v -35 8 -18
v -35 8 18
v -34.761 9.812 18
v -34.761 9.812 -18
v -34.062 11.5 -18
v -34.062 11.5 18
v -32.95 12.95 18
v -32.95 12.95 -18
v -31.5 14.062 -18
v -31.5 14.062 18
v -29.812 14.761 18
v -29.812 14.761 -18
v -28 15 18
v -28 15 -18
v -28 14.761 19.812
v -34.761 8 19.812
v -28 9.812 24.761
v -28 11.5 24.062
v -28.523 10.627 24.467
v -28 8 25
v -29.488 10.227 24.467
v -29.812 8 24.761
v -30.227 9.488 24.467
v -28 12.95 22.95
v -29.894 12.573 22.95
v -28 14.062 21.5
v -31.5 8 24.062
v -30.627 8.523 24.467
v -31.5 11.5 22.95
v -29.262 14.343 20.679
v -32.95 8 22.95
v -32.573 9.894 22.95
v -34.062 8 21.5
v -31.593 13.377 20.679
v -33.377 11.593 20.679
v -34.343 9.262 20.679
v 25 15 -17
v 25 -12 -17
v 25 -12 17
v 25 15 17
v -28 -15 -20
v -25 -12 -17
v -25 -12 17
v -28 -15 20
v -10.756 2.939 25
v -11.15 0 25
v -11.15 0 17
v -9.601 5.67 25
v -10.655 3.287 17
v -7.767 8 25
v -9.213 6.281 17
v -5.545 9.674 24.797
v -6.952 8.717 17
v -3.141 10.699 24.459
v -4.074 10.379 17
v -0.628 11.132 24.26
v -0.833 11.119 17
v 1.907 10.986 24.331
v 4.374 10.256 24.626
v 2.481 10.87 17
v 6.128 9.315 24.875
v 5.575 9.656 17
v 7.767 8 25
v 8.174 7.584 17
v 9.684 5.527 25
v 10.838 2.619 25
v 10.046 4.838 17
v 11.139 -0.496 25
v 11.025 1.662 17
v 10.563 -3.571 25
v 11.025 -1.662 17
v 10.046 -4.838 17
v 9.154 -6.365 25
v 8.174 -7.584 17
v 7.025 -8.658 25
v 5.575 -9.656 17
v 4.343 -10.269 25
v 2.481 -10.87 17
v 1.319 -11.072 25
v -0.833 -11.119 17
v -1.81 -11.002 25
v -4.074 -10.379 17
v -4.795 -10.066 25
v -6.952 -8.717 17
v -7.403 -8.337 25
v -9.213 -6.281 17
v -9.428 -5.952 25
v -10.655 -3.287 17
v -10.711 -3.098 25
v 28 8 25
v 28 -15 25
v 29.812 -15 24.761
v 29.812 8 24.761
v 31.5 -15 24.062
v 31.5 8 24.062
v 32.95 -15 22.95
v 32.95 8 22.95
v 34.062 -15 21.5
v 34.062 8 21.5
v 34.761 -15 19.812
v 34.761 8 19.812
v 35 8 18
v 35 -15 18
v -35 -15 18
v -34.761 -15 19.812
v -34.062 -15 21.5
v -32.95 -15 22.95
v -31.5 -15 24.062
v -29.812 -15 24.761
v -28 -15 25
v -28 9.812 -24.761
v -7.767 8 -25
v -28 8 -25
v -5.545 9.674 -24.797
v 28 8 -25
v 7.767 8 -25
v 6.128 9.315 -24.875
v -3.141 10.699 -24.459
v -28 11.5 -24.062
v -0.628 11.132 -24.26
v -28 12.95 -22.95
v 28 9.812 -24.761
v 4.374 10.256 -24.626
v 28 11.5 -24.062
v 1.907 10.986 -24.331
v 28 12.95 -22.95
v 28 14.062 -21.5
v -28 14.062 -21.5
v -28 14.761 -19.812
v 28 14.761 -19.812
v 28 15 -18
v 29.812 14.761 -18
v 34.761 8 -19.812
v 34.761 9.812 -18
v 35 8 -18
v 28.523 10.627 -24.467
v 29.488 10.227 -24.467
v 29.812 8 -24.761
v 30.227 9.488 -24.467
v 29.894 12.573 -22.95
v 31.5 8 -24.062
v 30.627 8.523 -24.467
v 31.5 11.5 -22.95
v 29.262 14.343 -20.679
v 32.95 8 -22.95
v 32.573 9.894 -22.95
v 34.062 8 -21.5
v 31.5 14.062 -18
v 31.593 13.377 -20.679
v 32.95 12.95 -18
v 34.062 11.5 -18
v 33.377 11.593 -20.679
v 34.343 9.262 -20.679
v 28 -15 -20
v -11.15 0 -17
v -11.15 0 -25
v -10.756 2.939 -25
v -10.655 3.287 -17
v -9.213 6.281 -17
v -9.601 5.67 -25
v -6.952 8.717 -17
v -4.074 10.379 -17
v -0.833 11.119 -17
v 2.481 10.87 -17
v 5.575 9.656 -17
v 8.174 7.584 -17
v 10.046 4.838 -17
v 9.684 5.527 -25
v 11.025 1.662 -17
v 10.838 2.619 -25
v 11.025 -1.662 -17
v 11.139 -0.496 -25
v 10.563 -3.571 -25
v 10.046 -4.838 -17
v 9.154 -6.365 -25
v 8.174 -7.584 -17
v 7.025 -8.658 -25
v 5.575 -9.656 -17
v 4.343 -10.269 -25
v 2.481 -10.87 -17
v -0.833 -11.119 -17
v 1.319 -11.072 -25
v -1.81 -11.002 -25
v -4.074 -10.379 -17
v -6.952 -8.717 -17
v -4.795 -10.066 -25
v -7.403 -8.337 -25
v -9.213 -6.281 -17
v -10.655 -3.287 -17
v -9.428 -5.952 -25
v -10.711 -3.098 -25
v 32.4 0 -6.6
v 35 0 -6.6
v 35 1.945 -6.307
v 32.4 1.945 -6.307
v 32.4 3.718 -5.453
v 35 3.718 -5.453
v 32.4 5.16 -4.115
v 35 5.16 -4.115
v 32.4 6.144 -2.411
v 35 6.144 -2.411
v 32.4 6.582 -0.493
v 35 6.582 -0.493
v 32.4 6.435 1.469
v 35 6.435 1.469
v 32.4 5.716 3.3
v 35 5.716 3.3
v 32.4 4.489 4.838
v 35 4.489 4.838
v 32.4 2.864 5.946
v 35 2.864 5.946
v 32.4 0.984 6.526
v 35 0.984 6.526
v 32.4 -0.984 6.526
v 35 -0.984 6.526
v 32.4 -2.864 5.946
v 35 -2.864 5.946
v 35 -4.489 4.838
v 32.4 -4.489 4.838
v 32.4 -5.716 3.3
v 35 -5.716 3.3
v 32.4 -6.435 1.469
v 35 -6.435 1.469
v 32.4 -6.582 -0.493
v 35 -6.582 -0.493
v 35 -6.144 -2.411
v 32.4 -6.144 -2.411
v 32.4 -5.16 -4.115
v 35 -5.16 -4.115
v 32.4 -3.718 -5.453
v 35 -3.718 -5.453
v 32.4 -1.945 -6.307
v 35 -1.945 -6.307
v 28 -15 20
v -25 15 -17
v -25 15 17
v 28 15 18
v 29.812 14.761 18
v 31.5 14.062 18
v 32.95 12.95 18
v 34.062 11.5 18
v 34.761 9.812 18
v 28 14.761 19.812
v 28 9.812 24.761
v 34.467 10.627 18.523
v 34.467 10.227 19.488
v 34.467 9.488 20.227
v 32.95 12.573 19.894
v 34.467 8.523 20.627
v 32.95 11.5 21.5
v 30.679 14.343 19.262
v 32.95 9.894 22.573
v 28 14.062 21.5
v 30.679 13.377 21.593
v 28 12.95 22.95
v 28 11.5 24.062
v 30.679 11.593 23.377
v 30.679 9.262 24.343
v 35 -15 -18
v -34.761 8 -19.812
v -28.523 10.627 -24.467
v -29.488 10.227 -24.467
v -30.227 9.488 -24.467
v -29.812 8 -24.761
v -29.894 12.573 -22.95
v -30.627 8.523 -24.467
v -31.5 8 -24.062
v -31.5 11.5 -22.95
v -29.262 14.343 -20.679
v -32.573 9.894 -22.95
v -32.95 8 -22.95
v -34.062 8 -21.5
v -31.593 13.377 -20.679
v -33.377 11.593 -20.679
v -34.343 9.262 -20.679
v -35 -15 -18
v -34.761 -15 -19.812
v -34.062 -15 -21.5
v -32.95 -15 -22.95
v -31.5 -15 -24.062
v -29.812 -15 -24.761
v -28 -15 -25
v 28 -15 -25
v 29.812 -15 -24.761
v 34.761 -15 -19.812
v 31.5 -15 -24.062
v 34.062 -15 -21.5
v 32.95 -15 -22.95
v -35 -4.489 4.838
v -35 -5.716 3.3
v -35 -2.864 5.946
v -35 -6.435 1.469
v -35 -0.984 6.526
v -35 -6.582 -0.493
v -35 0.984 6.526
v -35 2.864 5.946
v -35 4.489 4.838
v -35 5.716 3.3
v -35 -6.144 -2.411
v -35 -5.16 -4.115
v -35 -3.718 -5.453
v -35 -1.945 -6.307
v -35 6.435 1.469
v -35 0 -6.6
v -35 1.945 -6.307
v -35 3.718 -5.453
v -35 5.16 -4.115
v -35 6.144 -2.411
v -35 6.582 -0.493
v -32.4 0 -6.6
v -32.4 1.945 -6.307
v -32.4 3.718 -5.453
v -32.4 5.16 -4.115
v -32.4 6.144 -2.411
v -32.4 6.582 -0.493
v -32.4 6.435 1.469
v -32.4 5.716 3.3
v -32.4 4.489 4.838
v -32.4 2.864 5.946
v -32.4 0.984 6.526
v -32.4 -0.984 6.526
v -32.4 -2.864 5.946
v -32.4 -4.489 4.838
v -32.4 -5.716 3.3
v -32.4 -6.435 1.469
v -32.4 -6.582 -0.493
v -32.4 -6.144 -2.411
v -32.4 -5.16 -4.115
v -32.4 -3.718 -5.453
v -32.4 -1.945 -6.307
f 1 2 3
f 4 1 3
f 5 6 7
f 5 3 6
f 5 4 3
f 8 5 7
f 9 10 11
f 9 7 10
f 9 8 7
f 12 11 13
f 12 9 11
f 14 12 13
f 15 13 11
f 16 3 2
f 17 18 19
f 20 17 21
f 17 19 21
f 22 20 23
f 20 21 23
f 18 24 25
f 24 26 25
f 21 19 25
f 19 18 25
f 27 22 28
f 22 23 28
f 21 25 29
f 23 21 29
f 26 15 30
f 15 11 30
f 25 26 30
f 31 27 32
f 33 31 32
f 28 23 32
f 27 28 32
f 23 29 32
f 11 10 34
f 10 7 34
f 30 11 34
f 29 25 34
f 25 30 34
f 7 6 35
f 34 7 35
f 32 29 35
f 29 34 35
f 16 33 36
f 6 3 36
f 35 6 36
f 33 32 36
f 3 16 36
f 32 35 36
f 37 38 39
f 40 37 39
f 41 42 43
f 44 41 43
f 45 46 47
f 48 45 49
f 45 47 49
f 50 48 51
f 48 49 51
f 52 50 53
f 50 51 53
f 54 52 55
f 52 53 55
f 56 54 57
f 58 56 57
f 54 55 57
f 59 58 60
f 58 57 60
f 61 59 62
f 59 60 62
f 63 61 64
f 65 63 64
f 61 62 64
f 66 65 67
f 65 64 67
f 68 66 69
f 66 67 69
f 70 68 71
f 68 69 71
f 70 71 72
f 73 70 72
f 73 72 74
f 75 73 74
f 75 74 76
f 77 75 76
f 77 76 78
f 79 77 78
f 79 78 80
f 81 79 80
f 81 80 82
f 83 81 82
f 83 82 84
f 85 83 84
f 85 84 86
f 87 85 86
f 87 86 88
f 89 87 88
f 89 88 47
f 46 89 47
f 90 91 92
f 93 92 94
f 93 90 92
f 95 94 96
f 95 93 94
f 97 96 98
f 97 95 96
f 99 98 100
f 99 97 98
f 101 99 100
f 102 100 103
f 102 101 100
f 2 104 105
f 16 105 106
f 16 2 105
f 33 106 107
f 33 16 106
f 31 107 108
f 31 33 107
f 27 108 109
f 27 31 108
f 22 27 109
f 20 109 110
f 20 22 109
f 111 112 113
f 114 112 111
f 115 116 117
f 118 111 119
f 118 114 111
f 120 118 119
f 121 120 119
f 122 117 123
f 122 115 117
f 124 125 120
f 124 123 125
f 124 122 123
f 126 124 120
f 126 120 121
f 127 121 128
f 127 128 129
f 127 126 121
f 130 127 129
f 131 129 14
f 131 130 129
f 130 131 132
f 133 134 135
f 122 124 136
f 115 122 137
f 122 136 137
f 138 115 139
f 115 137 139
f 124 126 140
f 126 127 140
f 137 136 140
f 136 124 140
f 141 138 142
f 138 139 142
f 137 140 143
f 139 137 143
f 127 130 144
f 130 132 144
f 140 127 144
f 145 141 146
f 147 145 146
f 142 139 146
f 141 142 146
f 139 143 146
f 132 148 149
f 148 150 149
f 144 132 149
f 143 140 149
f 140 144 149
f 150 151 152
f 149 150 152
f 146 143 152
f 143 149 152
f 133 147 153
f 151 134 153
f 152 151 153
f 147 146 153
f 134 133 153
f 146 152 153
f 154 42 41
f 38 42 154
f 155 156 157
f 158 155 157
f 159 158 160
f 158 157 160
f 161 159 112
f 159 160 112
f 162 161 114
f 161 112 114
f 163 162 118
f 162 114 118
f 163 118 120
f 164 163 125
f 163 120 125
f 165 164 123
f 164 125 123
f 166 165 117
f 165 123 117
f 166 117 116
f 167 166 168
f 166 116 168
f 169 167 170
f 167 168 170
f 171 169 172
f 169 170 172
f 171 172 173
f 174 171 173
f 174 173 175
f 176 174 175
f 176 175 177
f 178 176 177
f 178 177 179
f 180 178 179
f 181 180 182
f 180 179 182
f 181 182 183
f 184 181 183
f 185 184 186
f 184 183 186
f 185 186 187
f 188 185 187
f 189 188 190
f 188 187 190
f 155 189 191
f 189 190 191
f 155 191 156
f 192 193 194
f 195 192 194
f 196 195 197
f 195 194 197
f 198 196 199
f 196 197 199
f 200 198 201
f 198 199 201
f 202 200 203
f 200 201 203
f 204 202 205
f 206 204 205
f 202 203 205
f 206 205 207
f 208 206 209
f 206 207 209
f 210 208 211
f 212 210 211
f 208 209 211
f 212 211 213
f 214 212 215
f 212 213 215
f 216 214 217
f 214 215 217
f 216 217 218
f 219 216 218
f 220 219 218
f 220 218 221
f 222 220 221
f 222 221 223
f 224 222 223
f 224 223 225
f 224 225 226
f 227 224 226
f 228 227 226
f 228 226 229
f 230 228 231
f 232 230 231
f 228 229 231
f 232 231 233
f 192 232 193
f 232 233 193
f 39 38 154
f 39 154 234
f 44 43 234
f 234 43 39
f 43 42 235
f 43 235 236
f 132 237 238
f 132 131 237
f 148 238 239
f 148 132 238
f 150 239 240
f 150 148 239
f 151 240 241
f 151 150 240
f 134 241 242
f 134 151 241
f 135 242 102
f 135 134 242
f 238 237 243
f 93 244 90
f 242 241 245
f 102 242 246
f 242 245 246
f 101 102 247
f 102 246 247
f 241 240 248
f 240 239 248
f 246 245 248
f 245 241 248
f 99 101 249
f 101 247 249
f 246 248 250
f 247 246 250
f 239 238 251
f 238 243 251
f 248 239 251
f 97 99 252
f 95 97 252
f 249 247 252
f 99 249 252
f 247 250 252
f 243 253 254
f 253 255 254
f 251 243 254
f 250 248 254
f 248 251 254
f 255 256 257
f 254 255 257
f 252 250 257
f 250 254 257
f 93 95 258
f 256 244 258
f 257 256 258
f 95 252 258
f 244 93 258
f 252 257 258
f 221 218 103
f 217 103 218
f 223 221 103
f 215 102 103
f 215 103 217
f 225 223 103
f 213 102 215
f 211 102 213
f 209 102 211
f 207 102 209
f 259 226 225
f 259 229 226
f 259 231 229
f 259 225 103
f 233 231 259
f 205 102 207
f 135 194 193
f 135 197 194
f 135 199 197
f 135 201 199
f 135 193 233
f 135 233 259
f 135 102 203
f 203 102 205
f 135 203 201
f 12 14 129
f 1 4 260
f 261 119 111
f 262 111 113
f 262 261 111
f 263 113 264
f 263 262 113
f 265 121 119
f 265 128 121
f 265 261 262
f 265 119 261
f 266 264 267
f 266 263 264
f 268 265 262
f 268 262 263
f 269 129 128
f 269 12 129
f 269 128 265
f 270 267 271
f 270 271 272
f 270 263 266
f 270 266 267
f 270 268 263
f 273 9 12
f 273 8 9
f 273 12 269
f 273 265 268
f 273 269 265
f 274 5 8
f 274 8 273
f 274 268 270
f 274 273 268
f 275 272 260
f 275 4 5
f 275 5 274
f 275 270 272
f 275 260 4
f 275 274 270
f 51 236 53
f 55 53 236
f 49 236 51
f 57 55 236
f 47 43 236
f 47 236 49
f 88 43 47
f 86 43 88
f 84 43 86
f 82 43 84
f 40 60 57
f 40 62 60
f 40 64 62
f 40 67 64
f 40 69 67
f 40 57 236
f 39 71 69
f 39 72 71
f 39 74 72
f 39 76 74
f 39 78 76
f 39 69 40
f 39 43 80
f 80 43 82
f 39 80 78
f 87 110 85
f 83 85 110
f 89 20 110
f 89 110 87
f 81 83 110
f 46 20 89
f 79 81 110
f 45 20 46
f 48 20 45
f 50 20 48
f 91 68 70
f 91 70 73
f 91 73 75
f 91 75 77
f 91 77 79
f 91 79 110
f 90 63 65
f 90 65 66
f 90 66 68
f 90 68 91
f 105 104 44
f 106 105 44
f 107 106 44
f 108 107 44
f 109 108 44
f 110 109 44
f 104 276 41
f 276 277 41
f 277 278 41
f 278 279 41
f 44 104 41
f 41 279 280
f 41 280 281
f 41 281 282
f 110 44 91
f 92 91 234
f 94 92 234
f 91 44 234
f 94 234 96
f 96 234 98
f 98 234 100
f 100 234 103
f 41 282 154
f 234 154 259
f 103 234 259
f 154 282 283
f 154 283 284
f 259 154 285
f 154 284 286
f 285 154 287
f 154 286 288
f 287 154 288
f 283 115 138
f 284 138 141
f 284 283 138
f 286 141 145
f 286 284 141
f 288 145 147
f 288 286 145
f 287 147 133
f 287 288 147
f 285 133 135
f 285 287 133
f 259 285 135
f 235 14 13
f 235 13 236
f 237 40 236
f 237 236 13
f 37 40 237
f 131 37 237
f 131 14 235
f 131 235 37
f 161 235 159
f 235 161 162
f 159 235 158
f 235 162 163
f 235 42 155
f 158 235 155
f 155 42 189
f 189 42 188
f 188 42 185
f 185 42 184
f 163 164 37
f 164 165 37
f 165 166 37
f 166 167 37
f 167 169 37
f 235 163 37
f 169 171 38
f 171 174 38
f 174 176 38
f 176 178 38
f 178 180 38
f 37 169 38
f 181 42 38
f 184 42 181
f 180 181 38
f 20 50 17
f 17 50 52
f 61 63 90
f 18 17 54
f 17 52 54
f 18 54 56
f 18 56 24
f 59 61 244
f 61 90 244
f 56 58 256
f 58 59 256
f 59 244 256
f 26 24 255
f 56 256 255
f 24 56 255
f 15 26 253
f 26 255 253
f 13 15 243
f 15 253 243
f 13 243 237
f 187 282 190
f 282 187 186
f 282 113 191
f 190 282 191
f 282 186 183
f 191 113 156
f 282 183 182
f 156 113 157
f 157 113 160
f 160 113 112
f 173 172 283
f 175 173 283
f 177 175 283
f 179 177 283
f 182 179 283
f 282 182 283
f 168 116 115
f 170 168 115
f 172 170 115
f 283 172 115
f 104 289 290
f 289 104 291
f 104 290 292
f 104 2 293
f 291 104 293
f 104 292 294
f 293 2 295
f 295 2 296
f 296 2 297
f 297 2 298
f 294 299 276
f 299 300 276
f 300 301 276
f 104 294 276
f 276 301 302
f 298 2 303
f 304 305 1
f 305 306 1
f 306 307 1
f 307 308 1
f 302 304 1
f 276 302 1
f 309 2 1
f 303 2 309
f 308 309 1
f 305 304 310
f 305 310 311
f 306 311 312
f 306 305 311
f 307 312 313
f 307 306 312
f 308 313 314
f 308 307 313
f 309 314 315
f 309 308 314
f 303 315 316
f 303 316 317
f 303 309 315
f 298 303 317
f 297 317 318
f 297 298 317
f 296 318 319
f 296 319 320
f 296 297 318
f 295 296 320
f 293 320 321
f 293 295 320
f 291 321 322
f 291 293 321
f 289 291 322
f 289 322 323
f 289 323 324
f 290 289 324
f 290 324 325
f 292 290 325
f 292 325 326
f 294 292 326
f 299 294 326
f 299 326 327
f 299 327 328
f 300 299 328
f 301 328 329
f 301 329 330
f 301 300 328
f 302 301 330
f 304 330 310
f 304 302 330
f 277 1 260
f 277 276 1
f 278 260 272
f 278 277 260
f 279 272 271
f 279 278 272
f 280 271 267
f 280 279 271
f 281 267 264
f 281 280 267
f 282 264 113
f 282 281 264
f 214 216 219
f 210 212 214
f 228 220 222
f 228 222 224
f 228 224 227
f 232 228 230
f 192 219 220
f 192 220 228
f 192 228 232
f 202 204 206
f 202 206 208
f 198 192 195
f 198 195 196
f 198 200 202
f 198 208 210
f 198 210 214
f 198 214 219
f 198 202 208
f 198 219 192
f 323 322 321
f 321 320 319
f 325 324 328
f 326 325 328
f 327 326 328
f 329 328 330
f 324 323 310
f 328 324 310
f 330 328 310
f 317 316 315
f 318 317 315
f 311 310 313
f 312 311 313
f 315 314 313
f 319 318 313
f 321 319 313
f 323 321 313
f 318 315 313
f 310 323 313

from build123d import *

# Parameters (mm, degrees)
SKETCH1_W               = 70
SKETCH1_H               = 50
BOSS_EXTRUDE1_DEPTH     = 15
SKETCH2_W               = 50
SKETCH2_H               = 34
CUT_EXTRUDE1_DEPTH      = 1
CUT_EXTRUDE1_DEPTH_BACK = 31
FILLET1_R               = 7
CHAMFER1_SIZE           = 3
SKETCH3_R               = 11.15
CUT_EXTRUDE2_DEPTH      = 1
CUT_EXTRUDE2_DEPTH_BACK = 51
SKETCH4_R               = 6.6
CUT_EXTRUDE3_DEPTH      = 2.6


with BuildPart() as part:
    # Sketch1 → Boss-Extrude1 (new body, symmetric)
    with BuildSketch(Plane(origin=(0, 0, 0), x_dir=(1, 0, 0), z_dir=(0, 1, 0))):
        Rectangle(SKETCH1_W, SKETCH1_H)
    extrude(amount=BOSS_EXTRUDE1_DEPTH, both=True)

    # Sketch2 → Cut-Extrude1 (cut, two sides)
    with BuildSketch(Plane.XZ.offset(15)) as cut_extrude1_sk:
        Rectangle(SKETCH2_W, SKETCH2_H)
    extrude(amount=CUT_EXTRUDE1_DEPTH, mode=Mode.SUBTRACT)
    extrude(cut_extrude1_sk.sketch, amount=-CUT_EXTRUDE1_DEPTH_BACK, mode=Mode.SUBTRACT)

    # Fillet1
    fillet1_edges = [part.edges().sort_by_distance(p)[0] for p in [
        (-35, 15, 0),
        (0, 15, 25),
        (35, 15, 0),
        (0, 15, -25),
        (35, 0, 25),
        (-35, 0, 25),
        (-35, 0, -25),
        (35, 0, -25),
    ]]
    fillet(fillet1_edges, radius=FILLET1_R)

    # Chamfer1
    chamfer1_edges = [part.edges().sort_by_distance(p)[0] for p in [
        (0, -15, 17),
        (-25, -15, 0),
        (0, -15, -17),
        (25, -15, 0),
    ]]
    chamfer(chamfer1_edges, length=CHAMFER1_SIZE)

    # Sketch3 → Cut-Extrude2 (cut, two sides)
    with BuildSketch(Plane(origin=(0, 0, -25), x_dir=(-1, 0, 0), z_dir=(0, 0, -1))) as cut_extrude2_sk:
        Circle(SKETCH3_R)
    extrude(amount=CUT_EXTRUDE2_DEPTH, mode=Mode.SUBTRACT)
    extrude(cut_extrude2_sk.sketch, amount=-CUT_EXTRUDE2_DEPTH_BACK, mode=Mode.SUBTRACT)

    # Sketch4 → Cut-Extrude3 (cut)
    with BuildSketch(Plane(origin=(35, 0, 0), x_dir=(0, 0, -1), z_dir=(1, 0, 0))):
        Circle(SKETCH4_R)
    cut_extrude3 = extrude(amount=-CUT_EXTRUDE3_DEPTH, mode=Mode.SUBTRACT)

    # Mirror1: Cut-Extrude3 across plane
    add(cut_extrude3.mirror(Plane(origin=(0, 0, 0), x_dir=(0, 0, 1), z_dir=(1, 0, 0))), mode=Mode.SUBTRACT)


solid = part.part
